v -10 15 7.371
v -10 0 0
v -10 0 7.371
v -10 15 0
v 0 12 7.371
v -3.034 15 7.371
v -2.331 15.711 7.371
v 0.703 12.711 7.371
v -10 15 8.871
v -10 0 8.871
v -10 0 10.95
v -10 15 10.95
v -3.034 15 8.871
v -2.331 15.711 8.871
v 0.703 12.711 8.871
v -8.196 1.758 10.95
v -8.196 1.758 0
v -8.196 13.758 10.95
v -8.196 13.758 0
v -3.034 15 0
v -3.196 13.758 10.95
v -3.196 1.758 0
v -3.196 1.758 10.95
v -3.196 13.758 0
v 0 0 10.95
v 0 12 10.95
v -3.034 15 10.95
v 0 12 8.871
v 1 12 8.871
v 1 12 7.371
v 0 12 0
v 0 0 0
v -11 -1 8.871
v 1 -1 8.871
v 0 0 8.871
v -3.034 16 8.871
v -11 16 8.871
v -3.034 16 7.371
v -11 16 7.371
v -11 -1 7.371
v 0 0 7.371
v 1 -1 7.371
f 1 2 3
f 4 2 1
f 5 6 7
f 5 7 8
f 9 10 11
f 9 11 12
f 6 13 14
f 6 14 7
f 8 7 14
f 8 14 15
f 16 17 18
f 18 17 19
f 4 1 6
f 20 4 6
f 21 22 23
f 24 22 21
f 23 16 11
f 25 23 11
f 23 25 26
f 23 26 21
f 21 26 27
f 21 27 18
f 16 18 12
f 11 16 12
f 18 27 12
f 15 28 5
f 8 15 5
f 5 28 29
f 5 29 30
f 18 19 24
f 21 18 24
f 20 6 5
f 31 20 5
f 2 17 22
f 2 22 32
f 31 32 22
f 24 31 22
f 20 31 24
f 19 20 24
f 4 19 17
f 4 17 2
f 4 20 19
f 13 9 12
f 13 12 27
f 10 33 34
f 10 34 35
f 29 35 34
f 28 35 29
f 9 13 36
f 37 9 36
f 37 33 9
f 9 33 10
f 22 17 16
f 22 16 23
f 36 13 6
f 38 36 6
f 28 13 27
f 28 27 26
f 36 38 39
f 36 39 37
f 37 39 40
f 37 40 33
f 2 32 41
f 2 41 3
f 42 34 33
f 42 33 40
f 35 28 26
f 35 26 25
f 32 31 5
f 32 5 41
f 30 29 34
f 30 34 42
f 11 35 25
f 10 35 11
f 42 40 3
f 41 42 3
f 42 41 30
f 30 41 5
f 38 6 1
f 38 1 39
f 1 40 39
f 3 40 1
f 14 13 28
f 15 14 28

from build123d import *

# Parameters (mm, degrees)
SKETCH1_W           = 5
SKETCH1_H           = 12
BOSS_EXTRUDE1_DEPTH = 10.95
SKETCH6_W           = 6.966027875
SKETCH6_H           = 1.5
BOSS_EXTRUDE2_DEPTH = 1
SKETCH4_W           = 10
SKETCH4_H           = 1.5
BOSS_EXTRUDE4_DEPTH = 1
SKETCH9_W           = 1.5
SKETCH9_H           = 17
BOSS_EXTRUDE5_DEPTH = 1
SKETCH10_W          = 1.5
SKETCH10_H          = 13
BOSS_EXTRUDE6_DEPTH = 1
SKETCH11_W          = 4.266730231
SKETCH11_H          = 1.5
BOSS_EXTRUDE7_DEPTH = 1


with BuildPart() as part:
    # Sketch1 → Boss-Extrude1 (new body)
    with BuildSketch(Plane.XY):
        Polygon((0, 0), (-10, 0), (-10, 15), (-3.033972125, 15), (0, 12), align=None)
        with Locations((-5.696428571, 7.758057491)):
            Rectangle(SKETCH1_W, SKETCH1_H, mode=Mode.SUBTRACT)
    extrude(amount=BOSS_EXTRUDE1_DEPTH)

    # Sketch6 → Boss-Extrude2 (add)
    with BuildSketch(Plane(origin=(0, 15, 0), x_dir=(1, 0, 0), z_dir=(0, 1, 0))):
        with Locations((-6.516986063, -8.120873767)):
            Rectangle(SKETCH6_W, SKETCH6_H)
    extrude(amount=BOSS_EXTRUDE2_DEPTH)

    # Sketch4 → Boss-Extrude4 (add)
    with BuildSketch(Plane.XZ):
        with Locations((-5, 8.120873767)):
            Rectangle(SKETCH4_W, SKETCH4_H)
    extrude(amount=BOSS_EXTRUDE4_DEPTH)

    # Sketch9 → Boss-Extrude5 (add)
    with BuildSketch(Plane.ZY.offset(10)):
        with Locations((8.120873767, 7.5)):
            Rectangle(SKETCH9_W, SKETCH9_H)
    extrude(amount=BOSS_EXTRUDE5_DEPTH)

    # Sketch10 → Boss-Extrude6 (add)
    with BuildSketch(Plane(origin=(0, 0, 0), x_dir=(0, 0, -1), z_dir=(1, 0, 0))):
        with Locations((-8.120873767, 5.5)):
            Rectangle(SKETCH10_W, SKETCH10_H)
    extrude(amount=BOSS_EXTRUDE6_DEPTH)

    # Sketch11 → Boss-Extrude7 (add)
    with BuildSketch(Plane(origin=(5.99961963, 6.067559573, 0), x_dir=(0.7110766234784633, -0.7031145251966195, 0), z_dir=(0.7031145251966195, 0.7110766234784633, 0))):
        with Locations((-10.570739418, -8.120873767)):
            Rectangle(SKETCH11_W, SKETCH11_H)
    extrude(amount=BOSS_EXTRUDE7_DEPTH)


solid = part.part
